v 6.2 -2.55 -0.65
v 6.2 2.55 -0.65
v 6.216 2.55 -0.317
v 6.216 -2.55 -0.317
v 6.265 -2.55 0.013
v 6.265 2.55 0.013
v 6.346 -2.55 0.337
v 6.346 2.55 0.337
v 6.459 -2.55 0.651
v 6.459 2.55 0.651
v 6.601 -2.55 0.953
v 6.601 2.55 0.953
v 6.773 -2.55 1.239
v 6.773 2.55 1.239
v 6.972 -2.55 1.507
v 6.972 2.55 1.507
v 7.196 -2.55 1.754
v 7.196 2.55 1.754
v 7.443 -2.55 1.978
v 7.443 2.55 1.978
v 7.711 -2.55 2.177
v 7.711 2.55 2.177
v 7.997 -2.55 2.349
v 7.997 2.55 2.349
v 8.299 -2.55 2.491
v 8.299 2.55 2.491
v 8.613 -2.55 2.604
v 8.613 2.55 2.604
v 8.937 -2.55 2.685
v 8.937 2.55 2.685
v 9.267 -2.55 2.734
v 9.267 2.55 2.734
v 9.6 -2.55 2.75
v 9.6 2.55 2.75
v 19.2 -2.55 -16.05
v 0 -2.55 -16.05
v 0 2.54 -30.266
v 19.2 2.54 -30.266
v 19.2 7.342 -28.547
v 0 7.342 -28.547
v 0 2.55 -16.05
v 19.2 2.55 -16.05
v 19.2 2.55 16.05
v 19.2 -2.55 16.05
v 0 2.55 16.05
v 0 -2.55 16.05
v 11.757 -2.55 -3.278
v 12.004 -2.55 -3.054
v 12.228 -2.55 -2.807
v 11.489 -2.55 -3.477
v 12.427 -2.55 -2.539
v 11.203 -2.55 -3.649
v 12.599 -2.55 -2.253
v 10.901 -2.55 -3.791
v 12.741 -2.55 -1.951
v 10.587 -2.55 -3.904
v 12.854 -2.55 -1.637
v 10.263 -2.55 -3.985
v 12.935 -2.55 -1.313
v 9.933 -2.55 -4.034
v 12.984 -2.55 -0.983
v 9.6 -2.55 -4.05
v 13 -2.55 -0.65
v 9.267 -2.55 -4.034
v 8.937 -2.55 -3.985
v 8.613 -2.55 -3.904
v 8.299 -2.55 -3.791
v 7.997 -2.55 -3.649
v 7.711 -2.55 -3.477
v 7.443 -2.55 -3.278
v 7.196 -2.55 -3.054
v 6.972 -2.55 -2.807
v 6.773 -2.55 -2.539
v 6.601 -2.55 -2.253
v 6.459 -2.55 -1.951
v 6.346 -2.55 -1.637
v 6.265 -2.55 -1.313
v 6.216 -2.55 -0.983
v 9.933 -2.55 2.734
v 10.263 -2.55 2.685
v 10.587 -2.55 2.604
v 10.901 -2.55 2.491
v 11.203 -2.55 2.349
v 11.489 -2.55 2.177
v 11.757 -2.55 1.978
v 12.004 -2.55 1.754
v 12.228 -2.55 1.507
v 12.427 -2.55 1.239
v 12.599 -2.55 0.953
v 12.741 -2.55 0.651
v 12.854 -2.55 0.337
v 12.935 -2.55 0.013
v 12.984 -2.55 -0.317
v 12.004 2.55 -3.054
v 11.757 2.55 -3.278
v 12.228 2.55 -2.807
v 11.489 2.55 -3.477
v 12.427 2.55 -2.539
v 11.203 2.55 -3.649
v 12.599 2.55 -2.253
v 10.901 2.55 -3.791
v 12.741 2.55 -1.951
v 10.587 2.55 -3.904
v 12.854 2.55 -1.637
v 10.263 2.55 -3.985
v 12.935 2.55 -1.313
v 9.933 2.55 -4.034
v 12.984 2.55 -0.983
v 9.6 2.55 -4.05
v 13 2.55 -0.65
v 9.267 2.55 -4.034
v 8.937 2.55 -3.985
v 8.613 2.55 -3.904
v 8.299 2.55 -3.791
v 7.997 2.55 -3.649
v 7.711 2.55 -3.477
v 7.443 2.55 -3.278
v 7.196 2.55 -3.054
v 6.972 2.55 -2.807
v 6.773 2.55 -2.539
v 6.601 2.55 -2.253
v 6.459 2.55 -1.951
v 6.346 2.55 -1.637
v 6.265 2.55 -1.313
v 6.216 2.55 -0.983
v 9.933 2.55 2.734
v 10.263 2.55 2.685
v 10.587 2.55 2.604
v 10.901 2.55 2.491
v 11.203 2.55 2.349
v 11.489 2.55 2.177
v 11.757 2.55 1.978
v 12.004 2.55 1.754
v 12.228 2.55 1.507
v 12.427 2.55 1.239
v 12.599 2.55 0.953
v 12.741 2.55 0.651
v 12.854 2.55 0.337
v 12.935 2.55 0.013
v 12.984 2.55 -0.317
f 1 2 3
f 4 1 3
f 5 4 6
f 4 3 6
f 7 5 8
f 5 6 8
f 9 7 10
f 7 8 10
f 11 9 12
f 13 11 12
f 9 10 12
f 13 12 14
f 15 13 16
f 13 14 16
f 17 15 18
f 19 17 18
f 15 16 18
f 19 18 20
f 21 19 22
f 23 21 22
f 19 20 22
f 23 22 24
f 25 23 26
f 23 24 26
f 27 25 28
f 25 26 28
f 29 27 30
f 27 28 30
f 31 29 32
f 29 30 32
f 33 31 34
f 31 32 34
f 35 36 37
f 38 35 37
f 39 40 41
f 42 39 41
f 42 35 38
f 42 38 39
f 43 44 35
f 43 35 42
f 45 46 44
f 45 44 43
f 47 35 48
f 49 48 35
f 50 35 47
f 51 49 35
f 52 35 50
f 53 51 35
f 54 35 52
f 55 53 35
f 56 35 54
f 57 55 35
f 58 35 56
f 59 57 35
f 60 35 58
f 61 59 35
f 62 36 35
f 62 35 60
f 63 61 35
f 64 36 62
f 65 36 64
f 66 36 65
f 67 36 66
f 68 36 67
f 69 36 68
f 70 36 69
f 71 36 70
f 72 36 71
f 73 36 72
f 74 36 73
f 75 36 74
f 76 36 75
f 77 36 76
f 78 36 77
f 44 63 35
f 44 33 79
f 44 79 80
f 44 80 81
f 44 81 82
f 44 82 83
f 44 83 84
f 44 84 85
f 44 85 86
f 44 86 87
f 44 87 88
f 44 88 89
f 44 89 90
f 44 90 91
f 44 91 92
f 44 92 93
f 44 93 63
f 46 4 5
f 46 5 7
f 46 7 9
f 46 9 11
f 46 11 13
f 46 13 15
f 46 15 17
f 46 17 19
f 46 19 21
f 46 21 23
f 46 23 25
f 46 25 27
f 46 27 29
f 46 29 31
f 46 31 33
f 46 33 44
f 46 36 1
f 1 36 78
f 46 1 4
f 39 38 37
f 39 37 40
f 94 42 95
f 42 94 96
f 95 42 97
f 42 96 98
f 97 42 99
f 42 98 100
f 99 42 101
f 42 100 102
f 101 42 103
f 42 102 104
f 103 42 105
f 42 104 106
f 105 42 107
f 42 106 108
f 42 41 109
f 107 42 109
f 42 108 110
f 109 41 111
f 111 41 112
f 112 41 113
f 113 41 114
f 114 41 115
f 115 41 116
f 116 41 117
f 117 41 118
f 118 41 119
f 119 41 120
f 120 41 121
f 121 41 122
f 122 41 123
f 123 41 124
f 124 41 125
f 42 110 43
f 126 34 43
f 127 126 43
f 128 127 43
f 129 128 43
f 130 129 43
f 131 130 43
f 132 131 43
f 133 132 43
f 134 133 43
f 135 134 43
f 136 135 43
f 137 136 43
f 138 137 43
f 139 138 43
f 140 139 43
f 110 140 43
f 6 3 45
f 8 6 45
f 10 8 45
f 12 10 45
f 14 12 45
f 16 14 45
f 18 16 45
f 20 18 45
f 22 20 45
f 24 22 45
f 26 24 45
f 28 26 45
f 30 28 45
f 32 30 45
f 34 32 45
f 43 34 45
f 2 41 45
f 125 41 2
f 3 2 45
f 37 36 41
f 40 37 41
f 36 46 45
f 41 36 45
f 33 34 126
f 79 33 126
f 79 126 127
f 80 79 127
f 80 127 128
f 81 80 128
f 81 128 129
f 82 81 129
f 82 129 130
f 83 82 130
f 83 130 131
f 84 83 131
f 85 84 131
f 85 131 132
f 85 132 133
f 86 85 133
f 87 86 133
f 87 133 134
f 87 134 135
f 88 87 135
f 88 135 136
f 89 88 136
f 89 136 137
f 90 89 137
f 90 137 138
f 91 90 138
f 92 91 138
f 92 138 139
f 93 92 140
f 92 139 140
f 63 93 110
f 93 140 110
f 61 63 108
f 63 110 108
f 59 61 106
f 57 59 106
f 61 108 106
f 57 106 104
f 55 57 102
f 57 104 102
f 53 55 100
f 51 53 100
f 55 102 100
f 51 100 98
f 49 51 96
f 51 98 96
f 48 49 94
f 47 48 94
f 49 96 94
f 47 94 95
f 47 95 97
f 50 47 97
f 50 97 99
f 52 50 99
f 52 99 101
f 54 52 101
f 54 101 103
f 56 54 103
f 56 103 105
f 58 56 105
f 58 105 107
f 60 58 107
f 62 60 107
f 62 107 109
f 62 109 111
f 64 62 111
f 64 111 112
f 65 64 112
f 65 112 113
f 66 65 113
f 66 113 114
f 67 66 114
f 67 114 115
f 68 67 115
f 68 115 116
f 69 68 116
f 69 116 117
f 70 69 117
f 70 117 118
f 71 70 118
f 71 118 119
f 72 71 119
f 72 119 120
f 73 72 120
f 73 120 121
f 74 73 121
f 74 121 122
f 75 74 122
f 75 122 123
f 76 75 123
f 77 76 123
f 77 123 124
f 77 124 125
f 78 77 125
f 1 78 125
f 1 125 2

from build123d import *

# Parameters (mm, degrees)
F0_W     = 5.1
F0_H     = 32.1
F1_DEPTH = 19.2
F3_DEPTH = 5.101


with BuildPart() as f1:
    # F0 (on Right) → F1 (new body)
    with BuildSketch(Plane.YZ):
        Rectangle(F0_W, F0_H)
        Polygon((2.55, -16.05), (-2.55, -16.05), (2.540138, -30.266205), (7.341638, -28.547019), align=None)
    extrude(amount=F1_DEPTH)

    # F2 (on face) → F3 (cut, through all)
    with BuildSketch(Plane(origin=(0, 2.55, 0), x_dir=(-1, 0, 0), z_dir=(0, 1, 0))):
        with BuildLine():
            ThreePointArc((-9.6, 2.75), (-12.004163, -3.054163), (-6.2, -0.65))
            ThreePointArc((-6.2, -0.65), (-7.195837, 1.754163), (-9.6, 2.75))
        make_face()
    extrude(amount=-F3_DEPTH, mode=Mode.SUBTRACT)


solid = f1.part
